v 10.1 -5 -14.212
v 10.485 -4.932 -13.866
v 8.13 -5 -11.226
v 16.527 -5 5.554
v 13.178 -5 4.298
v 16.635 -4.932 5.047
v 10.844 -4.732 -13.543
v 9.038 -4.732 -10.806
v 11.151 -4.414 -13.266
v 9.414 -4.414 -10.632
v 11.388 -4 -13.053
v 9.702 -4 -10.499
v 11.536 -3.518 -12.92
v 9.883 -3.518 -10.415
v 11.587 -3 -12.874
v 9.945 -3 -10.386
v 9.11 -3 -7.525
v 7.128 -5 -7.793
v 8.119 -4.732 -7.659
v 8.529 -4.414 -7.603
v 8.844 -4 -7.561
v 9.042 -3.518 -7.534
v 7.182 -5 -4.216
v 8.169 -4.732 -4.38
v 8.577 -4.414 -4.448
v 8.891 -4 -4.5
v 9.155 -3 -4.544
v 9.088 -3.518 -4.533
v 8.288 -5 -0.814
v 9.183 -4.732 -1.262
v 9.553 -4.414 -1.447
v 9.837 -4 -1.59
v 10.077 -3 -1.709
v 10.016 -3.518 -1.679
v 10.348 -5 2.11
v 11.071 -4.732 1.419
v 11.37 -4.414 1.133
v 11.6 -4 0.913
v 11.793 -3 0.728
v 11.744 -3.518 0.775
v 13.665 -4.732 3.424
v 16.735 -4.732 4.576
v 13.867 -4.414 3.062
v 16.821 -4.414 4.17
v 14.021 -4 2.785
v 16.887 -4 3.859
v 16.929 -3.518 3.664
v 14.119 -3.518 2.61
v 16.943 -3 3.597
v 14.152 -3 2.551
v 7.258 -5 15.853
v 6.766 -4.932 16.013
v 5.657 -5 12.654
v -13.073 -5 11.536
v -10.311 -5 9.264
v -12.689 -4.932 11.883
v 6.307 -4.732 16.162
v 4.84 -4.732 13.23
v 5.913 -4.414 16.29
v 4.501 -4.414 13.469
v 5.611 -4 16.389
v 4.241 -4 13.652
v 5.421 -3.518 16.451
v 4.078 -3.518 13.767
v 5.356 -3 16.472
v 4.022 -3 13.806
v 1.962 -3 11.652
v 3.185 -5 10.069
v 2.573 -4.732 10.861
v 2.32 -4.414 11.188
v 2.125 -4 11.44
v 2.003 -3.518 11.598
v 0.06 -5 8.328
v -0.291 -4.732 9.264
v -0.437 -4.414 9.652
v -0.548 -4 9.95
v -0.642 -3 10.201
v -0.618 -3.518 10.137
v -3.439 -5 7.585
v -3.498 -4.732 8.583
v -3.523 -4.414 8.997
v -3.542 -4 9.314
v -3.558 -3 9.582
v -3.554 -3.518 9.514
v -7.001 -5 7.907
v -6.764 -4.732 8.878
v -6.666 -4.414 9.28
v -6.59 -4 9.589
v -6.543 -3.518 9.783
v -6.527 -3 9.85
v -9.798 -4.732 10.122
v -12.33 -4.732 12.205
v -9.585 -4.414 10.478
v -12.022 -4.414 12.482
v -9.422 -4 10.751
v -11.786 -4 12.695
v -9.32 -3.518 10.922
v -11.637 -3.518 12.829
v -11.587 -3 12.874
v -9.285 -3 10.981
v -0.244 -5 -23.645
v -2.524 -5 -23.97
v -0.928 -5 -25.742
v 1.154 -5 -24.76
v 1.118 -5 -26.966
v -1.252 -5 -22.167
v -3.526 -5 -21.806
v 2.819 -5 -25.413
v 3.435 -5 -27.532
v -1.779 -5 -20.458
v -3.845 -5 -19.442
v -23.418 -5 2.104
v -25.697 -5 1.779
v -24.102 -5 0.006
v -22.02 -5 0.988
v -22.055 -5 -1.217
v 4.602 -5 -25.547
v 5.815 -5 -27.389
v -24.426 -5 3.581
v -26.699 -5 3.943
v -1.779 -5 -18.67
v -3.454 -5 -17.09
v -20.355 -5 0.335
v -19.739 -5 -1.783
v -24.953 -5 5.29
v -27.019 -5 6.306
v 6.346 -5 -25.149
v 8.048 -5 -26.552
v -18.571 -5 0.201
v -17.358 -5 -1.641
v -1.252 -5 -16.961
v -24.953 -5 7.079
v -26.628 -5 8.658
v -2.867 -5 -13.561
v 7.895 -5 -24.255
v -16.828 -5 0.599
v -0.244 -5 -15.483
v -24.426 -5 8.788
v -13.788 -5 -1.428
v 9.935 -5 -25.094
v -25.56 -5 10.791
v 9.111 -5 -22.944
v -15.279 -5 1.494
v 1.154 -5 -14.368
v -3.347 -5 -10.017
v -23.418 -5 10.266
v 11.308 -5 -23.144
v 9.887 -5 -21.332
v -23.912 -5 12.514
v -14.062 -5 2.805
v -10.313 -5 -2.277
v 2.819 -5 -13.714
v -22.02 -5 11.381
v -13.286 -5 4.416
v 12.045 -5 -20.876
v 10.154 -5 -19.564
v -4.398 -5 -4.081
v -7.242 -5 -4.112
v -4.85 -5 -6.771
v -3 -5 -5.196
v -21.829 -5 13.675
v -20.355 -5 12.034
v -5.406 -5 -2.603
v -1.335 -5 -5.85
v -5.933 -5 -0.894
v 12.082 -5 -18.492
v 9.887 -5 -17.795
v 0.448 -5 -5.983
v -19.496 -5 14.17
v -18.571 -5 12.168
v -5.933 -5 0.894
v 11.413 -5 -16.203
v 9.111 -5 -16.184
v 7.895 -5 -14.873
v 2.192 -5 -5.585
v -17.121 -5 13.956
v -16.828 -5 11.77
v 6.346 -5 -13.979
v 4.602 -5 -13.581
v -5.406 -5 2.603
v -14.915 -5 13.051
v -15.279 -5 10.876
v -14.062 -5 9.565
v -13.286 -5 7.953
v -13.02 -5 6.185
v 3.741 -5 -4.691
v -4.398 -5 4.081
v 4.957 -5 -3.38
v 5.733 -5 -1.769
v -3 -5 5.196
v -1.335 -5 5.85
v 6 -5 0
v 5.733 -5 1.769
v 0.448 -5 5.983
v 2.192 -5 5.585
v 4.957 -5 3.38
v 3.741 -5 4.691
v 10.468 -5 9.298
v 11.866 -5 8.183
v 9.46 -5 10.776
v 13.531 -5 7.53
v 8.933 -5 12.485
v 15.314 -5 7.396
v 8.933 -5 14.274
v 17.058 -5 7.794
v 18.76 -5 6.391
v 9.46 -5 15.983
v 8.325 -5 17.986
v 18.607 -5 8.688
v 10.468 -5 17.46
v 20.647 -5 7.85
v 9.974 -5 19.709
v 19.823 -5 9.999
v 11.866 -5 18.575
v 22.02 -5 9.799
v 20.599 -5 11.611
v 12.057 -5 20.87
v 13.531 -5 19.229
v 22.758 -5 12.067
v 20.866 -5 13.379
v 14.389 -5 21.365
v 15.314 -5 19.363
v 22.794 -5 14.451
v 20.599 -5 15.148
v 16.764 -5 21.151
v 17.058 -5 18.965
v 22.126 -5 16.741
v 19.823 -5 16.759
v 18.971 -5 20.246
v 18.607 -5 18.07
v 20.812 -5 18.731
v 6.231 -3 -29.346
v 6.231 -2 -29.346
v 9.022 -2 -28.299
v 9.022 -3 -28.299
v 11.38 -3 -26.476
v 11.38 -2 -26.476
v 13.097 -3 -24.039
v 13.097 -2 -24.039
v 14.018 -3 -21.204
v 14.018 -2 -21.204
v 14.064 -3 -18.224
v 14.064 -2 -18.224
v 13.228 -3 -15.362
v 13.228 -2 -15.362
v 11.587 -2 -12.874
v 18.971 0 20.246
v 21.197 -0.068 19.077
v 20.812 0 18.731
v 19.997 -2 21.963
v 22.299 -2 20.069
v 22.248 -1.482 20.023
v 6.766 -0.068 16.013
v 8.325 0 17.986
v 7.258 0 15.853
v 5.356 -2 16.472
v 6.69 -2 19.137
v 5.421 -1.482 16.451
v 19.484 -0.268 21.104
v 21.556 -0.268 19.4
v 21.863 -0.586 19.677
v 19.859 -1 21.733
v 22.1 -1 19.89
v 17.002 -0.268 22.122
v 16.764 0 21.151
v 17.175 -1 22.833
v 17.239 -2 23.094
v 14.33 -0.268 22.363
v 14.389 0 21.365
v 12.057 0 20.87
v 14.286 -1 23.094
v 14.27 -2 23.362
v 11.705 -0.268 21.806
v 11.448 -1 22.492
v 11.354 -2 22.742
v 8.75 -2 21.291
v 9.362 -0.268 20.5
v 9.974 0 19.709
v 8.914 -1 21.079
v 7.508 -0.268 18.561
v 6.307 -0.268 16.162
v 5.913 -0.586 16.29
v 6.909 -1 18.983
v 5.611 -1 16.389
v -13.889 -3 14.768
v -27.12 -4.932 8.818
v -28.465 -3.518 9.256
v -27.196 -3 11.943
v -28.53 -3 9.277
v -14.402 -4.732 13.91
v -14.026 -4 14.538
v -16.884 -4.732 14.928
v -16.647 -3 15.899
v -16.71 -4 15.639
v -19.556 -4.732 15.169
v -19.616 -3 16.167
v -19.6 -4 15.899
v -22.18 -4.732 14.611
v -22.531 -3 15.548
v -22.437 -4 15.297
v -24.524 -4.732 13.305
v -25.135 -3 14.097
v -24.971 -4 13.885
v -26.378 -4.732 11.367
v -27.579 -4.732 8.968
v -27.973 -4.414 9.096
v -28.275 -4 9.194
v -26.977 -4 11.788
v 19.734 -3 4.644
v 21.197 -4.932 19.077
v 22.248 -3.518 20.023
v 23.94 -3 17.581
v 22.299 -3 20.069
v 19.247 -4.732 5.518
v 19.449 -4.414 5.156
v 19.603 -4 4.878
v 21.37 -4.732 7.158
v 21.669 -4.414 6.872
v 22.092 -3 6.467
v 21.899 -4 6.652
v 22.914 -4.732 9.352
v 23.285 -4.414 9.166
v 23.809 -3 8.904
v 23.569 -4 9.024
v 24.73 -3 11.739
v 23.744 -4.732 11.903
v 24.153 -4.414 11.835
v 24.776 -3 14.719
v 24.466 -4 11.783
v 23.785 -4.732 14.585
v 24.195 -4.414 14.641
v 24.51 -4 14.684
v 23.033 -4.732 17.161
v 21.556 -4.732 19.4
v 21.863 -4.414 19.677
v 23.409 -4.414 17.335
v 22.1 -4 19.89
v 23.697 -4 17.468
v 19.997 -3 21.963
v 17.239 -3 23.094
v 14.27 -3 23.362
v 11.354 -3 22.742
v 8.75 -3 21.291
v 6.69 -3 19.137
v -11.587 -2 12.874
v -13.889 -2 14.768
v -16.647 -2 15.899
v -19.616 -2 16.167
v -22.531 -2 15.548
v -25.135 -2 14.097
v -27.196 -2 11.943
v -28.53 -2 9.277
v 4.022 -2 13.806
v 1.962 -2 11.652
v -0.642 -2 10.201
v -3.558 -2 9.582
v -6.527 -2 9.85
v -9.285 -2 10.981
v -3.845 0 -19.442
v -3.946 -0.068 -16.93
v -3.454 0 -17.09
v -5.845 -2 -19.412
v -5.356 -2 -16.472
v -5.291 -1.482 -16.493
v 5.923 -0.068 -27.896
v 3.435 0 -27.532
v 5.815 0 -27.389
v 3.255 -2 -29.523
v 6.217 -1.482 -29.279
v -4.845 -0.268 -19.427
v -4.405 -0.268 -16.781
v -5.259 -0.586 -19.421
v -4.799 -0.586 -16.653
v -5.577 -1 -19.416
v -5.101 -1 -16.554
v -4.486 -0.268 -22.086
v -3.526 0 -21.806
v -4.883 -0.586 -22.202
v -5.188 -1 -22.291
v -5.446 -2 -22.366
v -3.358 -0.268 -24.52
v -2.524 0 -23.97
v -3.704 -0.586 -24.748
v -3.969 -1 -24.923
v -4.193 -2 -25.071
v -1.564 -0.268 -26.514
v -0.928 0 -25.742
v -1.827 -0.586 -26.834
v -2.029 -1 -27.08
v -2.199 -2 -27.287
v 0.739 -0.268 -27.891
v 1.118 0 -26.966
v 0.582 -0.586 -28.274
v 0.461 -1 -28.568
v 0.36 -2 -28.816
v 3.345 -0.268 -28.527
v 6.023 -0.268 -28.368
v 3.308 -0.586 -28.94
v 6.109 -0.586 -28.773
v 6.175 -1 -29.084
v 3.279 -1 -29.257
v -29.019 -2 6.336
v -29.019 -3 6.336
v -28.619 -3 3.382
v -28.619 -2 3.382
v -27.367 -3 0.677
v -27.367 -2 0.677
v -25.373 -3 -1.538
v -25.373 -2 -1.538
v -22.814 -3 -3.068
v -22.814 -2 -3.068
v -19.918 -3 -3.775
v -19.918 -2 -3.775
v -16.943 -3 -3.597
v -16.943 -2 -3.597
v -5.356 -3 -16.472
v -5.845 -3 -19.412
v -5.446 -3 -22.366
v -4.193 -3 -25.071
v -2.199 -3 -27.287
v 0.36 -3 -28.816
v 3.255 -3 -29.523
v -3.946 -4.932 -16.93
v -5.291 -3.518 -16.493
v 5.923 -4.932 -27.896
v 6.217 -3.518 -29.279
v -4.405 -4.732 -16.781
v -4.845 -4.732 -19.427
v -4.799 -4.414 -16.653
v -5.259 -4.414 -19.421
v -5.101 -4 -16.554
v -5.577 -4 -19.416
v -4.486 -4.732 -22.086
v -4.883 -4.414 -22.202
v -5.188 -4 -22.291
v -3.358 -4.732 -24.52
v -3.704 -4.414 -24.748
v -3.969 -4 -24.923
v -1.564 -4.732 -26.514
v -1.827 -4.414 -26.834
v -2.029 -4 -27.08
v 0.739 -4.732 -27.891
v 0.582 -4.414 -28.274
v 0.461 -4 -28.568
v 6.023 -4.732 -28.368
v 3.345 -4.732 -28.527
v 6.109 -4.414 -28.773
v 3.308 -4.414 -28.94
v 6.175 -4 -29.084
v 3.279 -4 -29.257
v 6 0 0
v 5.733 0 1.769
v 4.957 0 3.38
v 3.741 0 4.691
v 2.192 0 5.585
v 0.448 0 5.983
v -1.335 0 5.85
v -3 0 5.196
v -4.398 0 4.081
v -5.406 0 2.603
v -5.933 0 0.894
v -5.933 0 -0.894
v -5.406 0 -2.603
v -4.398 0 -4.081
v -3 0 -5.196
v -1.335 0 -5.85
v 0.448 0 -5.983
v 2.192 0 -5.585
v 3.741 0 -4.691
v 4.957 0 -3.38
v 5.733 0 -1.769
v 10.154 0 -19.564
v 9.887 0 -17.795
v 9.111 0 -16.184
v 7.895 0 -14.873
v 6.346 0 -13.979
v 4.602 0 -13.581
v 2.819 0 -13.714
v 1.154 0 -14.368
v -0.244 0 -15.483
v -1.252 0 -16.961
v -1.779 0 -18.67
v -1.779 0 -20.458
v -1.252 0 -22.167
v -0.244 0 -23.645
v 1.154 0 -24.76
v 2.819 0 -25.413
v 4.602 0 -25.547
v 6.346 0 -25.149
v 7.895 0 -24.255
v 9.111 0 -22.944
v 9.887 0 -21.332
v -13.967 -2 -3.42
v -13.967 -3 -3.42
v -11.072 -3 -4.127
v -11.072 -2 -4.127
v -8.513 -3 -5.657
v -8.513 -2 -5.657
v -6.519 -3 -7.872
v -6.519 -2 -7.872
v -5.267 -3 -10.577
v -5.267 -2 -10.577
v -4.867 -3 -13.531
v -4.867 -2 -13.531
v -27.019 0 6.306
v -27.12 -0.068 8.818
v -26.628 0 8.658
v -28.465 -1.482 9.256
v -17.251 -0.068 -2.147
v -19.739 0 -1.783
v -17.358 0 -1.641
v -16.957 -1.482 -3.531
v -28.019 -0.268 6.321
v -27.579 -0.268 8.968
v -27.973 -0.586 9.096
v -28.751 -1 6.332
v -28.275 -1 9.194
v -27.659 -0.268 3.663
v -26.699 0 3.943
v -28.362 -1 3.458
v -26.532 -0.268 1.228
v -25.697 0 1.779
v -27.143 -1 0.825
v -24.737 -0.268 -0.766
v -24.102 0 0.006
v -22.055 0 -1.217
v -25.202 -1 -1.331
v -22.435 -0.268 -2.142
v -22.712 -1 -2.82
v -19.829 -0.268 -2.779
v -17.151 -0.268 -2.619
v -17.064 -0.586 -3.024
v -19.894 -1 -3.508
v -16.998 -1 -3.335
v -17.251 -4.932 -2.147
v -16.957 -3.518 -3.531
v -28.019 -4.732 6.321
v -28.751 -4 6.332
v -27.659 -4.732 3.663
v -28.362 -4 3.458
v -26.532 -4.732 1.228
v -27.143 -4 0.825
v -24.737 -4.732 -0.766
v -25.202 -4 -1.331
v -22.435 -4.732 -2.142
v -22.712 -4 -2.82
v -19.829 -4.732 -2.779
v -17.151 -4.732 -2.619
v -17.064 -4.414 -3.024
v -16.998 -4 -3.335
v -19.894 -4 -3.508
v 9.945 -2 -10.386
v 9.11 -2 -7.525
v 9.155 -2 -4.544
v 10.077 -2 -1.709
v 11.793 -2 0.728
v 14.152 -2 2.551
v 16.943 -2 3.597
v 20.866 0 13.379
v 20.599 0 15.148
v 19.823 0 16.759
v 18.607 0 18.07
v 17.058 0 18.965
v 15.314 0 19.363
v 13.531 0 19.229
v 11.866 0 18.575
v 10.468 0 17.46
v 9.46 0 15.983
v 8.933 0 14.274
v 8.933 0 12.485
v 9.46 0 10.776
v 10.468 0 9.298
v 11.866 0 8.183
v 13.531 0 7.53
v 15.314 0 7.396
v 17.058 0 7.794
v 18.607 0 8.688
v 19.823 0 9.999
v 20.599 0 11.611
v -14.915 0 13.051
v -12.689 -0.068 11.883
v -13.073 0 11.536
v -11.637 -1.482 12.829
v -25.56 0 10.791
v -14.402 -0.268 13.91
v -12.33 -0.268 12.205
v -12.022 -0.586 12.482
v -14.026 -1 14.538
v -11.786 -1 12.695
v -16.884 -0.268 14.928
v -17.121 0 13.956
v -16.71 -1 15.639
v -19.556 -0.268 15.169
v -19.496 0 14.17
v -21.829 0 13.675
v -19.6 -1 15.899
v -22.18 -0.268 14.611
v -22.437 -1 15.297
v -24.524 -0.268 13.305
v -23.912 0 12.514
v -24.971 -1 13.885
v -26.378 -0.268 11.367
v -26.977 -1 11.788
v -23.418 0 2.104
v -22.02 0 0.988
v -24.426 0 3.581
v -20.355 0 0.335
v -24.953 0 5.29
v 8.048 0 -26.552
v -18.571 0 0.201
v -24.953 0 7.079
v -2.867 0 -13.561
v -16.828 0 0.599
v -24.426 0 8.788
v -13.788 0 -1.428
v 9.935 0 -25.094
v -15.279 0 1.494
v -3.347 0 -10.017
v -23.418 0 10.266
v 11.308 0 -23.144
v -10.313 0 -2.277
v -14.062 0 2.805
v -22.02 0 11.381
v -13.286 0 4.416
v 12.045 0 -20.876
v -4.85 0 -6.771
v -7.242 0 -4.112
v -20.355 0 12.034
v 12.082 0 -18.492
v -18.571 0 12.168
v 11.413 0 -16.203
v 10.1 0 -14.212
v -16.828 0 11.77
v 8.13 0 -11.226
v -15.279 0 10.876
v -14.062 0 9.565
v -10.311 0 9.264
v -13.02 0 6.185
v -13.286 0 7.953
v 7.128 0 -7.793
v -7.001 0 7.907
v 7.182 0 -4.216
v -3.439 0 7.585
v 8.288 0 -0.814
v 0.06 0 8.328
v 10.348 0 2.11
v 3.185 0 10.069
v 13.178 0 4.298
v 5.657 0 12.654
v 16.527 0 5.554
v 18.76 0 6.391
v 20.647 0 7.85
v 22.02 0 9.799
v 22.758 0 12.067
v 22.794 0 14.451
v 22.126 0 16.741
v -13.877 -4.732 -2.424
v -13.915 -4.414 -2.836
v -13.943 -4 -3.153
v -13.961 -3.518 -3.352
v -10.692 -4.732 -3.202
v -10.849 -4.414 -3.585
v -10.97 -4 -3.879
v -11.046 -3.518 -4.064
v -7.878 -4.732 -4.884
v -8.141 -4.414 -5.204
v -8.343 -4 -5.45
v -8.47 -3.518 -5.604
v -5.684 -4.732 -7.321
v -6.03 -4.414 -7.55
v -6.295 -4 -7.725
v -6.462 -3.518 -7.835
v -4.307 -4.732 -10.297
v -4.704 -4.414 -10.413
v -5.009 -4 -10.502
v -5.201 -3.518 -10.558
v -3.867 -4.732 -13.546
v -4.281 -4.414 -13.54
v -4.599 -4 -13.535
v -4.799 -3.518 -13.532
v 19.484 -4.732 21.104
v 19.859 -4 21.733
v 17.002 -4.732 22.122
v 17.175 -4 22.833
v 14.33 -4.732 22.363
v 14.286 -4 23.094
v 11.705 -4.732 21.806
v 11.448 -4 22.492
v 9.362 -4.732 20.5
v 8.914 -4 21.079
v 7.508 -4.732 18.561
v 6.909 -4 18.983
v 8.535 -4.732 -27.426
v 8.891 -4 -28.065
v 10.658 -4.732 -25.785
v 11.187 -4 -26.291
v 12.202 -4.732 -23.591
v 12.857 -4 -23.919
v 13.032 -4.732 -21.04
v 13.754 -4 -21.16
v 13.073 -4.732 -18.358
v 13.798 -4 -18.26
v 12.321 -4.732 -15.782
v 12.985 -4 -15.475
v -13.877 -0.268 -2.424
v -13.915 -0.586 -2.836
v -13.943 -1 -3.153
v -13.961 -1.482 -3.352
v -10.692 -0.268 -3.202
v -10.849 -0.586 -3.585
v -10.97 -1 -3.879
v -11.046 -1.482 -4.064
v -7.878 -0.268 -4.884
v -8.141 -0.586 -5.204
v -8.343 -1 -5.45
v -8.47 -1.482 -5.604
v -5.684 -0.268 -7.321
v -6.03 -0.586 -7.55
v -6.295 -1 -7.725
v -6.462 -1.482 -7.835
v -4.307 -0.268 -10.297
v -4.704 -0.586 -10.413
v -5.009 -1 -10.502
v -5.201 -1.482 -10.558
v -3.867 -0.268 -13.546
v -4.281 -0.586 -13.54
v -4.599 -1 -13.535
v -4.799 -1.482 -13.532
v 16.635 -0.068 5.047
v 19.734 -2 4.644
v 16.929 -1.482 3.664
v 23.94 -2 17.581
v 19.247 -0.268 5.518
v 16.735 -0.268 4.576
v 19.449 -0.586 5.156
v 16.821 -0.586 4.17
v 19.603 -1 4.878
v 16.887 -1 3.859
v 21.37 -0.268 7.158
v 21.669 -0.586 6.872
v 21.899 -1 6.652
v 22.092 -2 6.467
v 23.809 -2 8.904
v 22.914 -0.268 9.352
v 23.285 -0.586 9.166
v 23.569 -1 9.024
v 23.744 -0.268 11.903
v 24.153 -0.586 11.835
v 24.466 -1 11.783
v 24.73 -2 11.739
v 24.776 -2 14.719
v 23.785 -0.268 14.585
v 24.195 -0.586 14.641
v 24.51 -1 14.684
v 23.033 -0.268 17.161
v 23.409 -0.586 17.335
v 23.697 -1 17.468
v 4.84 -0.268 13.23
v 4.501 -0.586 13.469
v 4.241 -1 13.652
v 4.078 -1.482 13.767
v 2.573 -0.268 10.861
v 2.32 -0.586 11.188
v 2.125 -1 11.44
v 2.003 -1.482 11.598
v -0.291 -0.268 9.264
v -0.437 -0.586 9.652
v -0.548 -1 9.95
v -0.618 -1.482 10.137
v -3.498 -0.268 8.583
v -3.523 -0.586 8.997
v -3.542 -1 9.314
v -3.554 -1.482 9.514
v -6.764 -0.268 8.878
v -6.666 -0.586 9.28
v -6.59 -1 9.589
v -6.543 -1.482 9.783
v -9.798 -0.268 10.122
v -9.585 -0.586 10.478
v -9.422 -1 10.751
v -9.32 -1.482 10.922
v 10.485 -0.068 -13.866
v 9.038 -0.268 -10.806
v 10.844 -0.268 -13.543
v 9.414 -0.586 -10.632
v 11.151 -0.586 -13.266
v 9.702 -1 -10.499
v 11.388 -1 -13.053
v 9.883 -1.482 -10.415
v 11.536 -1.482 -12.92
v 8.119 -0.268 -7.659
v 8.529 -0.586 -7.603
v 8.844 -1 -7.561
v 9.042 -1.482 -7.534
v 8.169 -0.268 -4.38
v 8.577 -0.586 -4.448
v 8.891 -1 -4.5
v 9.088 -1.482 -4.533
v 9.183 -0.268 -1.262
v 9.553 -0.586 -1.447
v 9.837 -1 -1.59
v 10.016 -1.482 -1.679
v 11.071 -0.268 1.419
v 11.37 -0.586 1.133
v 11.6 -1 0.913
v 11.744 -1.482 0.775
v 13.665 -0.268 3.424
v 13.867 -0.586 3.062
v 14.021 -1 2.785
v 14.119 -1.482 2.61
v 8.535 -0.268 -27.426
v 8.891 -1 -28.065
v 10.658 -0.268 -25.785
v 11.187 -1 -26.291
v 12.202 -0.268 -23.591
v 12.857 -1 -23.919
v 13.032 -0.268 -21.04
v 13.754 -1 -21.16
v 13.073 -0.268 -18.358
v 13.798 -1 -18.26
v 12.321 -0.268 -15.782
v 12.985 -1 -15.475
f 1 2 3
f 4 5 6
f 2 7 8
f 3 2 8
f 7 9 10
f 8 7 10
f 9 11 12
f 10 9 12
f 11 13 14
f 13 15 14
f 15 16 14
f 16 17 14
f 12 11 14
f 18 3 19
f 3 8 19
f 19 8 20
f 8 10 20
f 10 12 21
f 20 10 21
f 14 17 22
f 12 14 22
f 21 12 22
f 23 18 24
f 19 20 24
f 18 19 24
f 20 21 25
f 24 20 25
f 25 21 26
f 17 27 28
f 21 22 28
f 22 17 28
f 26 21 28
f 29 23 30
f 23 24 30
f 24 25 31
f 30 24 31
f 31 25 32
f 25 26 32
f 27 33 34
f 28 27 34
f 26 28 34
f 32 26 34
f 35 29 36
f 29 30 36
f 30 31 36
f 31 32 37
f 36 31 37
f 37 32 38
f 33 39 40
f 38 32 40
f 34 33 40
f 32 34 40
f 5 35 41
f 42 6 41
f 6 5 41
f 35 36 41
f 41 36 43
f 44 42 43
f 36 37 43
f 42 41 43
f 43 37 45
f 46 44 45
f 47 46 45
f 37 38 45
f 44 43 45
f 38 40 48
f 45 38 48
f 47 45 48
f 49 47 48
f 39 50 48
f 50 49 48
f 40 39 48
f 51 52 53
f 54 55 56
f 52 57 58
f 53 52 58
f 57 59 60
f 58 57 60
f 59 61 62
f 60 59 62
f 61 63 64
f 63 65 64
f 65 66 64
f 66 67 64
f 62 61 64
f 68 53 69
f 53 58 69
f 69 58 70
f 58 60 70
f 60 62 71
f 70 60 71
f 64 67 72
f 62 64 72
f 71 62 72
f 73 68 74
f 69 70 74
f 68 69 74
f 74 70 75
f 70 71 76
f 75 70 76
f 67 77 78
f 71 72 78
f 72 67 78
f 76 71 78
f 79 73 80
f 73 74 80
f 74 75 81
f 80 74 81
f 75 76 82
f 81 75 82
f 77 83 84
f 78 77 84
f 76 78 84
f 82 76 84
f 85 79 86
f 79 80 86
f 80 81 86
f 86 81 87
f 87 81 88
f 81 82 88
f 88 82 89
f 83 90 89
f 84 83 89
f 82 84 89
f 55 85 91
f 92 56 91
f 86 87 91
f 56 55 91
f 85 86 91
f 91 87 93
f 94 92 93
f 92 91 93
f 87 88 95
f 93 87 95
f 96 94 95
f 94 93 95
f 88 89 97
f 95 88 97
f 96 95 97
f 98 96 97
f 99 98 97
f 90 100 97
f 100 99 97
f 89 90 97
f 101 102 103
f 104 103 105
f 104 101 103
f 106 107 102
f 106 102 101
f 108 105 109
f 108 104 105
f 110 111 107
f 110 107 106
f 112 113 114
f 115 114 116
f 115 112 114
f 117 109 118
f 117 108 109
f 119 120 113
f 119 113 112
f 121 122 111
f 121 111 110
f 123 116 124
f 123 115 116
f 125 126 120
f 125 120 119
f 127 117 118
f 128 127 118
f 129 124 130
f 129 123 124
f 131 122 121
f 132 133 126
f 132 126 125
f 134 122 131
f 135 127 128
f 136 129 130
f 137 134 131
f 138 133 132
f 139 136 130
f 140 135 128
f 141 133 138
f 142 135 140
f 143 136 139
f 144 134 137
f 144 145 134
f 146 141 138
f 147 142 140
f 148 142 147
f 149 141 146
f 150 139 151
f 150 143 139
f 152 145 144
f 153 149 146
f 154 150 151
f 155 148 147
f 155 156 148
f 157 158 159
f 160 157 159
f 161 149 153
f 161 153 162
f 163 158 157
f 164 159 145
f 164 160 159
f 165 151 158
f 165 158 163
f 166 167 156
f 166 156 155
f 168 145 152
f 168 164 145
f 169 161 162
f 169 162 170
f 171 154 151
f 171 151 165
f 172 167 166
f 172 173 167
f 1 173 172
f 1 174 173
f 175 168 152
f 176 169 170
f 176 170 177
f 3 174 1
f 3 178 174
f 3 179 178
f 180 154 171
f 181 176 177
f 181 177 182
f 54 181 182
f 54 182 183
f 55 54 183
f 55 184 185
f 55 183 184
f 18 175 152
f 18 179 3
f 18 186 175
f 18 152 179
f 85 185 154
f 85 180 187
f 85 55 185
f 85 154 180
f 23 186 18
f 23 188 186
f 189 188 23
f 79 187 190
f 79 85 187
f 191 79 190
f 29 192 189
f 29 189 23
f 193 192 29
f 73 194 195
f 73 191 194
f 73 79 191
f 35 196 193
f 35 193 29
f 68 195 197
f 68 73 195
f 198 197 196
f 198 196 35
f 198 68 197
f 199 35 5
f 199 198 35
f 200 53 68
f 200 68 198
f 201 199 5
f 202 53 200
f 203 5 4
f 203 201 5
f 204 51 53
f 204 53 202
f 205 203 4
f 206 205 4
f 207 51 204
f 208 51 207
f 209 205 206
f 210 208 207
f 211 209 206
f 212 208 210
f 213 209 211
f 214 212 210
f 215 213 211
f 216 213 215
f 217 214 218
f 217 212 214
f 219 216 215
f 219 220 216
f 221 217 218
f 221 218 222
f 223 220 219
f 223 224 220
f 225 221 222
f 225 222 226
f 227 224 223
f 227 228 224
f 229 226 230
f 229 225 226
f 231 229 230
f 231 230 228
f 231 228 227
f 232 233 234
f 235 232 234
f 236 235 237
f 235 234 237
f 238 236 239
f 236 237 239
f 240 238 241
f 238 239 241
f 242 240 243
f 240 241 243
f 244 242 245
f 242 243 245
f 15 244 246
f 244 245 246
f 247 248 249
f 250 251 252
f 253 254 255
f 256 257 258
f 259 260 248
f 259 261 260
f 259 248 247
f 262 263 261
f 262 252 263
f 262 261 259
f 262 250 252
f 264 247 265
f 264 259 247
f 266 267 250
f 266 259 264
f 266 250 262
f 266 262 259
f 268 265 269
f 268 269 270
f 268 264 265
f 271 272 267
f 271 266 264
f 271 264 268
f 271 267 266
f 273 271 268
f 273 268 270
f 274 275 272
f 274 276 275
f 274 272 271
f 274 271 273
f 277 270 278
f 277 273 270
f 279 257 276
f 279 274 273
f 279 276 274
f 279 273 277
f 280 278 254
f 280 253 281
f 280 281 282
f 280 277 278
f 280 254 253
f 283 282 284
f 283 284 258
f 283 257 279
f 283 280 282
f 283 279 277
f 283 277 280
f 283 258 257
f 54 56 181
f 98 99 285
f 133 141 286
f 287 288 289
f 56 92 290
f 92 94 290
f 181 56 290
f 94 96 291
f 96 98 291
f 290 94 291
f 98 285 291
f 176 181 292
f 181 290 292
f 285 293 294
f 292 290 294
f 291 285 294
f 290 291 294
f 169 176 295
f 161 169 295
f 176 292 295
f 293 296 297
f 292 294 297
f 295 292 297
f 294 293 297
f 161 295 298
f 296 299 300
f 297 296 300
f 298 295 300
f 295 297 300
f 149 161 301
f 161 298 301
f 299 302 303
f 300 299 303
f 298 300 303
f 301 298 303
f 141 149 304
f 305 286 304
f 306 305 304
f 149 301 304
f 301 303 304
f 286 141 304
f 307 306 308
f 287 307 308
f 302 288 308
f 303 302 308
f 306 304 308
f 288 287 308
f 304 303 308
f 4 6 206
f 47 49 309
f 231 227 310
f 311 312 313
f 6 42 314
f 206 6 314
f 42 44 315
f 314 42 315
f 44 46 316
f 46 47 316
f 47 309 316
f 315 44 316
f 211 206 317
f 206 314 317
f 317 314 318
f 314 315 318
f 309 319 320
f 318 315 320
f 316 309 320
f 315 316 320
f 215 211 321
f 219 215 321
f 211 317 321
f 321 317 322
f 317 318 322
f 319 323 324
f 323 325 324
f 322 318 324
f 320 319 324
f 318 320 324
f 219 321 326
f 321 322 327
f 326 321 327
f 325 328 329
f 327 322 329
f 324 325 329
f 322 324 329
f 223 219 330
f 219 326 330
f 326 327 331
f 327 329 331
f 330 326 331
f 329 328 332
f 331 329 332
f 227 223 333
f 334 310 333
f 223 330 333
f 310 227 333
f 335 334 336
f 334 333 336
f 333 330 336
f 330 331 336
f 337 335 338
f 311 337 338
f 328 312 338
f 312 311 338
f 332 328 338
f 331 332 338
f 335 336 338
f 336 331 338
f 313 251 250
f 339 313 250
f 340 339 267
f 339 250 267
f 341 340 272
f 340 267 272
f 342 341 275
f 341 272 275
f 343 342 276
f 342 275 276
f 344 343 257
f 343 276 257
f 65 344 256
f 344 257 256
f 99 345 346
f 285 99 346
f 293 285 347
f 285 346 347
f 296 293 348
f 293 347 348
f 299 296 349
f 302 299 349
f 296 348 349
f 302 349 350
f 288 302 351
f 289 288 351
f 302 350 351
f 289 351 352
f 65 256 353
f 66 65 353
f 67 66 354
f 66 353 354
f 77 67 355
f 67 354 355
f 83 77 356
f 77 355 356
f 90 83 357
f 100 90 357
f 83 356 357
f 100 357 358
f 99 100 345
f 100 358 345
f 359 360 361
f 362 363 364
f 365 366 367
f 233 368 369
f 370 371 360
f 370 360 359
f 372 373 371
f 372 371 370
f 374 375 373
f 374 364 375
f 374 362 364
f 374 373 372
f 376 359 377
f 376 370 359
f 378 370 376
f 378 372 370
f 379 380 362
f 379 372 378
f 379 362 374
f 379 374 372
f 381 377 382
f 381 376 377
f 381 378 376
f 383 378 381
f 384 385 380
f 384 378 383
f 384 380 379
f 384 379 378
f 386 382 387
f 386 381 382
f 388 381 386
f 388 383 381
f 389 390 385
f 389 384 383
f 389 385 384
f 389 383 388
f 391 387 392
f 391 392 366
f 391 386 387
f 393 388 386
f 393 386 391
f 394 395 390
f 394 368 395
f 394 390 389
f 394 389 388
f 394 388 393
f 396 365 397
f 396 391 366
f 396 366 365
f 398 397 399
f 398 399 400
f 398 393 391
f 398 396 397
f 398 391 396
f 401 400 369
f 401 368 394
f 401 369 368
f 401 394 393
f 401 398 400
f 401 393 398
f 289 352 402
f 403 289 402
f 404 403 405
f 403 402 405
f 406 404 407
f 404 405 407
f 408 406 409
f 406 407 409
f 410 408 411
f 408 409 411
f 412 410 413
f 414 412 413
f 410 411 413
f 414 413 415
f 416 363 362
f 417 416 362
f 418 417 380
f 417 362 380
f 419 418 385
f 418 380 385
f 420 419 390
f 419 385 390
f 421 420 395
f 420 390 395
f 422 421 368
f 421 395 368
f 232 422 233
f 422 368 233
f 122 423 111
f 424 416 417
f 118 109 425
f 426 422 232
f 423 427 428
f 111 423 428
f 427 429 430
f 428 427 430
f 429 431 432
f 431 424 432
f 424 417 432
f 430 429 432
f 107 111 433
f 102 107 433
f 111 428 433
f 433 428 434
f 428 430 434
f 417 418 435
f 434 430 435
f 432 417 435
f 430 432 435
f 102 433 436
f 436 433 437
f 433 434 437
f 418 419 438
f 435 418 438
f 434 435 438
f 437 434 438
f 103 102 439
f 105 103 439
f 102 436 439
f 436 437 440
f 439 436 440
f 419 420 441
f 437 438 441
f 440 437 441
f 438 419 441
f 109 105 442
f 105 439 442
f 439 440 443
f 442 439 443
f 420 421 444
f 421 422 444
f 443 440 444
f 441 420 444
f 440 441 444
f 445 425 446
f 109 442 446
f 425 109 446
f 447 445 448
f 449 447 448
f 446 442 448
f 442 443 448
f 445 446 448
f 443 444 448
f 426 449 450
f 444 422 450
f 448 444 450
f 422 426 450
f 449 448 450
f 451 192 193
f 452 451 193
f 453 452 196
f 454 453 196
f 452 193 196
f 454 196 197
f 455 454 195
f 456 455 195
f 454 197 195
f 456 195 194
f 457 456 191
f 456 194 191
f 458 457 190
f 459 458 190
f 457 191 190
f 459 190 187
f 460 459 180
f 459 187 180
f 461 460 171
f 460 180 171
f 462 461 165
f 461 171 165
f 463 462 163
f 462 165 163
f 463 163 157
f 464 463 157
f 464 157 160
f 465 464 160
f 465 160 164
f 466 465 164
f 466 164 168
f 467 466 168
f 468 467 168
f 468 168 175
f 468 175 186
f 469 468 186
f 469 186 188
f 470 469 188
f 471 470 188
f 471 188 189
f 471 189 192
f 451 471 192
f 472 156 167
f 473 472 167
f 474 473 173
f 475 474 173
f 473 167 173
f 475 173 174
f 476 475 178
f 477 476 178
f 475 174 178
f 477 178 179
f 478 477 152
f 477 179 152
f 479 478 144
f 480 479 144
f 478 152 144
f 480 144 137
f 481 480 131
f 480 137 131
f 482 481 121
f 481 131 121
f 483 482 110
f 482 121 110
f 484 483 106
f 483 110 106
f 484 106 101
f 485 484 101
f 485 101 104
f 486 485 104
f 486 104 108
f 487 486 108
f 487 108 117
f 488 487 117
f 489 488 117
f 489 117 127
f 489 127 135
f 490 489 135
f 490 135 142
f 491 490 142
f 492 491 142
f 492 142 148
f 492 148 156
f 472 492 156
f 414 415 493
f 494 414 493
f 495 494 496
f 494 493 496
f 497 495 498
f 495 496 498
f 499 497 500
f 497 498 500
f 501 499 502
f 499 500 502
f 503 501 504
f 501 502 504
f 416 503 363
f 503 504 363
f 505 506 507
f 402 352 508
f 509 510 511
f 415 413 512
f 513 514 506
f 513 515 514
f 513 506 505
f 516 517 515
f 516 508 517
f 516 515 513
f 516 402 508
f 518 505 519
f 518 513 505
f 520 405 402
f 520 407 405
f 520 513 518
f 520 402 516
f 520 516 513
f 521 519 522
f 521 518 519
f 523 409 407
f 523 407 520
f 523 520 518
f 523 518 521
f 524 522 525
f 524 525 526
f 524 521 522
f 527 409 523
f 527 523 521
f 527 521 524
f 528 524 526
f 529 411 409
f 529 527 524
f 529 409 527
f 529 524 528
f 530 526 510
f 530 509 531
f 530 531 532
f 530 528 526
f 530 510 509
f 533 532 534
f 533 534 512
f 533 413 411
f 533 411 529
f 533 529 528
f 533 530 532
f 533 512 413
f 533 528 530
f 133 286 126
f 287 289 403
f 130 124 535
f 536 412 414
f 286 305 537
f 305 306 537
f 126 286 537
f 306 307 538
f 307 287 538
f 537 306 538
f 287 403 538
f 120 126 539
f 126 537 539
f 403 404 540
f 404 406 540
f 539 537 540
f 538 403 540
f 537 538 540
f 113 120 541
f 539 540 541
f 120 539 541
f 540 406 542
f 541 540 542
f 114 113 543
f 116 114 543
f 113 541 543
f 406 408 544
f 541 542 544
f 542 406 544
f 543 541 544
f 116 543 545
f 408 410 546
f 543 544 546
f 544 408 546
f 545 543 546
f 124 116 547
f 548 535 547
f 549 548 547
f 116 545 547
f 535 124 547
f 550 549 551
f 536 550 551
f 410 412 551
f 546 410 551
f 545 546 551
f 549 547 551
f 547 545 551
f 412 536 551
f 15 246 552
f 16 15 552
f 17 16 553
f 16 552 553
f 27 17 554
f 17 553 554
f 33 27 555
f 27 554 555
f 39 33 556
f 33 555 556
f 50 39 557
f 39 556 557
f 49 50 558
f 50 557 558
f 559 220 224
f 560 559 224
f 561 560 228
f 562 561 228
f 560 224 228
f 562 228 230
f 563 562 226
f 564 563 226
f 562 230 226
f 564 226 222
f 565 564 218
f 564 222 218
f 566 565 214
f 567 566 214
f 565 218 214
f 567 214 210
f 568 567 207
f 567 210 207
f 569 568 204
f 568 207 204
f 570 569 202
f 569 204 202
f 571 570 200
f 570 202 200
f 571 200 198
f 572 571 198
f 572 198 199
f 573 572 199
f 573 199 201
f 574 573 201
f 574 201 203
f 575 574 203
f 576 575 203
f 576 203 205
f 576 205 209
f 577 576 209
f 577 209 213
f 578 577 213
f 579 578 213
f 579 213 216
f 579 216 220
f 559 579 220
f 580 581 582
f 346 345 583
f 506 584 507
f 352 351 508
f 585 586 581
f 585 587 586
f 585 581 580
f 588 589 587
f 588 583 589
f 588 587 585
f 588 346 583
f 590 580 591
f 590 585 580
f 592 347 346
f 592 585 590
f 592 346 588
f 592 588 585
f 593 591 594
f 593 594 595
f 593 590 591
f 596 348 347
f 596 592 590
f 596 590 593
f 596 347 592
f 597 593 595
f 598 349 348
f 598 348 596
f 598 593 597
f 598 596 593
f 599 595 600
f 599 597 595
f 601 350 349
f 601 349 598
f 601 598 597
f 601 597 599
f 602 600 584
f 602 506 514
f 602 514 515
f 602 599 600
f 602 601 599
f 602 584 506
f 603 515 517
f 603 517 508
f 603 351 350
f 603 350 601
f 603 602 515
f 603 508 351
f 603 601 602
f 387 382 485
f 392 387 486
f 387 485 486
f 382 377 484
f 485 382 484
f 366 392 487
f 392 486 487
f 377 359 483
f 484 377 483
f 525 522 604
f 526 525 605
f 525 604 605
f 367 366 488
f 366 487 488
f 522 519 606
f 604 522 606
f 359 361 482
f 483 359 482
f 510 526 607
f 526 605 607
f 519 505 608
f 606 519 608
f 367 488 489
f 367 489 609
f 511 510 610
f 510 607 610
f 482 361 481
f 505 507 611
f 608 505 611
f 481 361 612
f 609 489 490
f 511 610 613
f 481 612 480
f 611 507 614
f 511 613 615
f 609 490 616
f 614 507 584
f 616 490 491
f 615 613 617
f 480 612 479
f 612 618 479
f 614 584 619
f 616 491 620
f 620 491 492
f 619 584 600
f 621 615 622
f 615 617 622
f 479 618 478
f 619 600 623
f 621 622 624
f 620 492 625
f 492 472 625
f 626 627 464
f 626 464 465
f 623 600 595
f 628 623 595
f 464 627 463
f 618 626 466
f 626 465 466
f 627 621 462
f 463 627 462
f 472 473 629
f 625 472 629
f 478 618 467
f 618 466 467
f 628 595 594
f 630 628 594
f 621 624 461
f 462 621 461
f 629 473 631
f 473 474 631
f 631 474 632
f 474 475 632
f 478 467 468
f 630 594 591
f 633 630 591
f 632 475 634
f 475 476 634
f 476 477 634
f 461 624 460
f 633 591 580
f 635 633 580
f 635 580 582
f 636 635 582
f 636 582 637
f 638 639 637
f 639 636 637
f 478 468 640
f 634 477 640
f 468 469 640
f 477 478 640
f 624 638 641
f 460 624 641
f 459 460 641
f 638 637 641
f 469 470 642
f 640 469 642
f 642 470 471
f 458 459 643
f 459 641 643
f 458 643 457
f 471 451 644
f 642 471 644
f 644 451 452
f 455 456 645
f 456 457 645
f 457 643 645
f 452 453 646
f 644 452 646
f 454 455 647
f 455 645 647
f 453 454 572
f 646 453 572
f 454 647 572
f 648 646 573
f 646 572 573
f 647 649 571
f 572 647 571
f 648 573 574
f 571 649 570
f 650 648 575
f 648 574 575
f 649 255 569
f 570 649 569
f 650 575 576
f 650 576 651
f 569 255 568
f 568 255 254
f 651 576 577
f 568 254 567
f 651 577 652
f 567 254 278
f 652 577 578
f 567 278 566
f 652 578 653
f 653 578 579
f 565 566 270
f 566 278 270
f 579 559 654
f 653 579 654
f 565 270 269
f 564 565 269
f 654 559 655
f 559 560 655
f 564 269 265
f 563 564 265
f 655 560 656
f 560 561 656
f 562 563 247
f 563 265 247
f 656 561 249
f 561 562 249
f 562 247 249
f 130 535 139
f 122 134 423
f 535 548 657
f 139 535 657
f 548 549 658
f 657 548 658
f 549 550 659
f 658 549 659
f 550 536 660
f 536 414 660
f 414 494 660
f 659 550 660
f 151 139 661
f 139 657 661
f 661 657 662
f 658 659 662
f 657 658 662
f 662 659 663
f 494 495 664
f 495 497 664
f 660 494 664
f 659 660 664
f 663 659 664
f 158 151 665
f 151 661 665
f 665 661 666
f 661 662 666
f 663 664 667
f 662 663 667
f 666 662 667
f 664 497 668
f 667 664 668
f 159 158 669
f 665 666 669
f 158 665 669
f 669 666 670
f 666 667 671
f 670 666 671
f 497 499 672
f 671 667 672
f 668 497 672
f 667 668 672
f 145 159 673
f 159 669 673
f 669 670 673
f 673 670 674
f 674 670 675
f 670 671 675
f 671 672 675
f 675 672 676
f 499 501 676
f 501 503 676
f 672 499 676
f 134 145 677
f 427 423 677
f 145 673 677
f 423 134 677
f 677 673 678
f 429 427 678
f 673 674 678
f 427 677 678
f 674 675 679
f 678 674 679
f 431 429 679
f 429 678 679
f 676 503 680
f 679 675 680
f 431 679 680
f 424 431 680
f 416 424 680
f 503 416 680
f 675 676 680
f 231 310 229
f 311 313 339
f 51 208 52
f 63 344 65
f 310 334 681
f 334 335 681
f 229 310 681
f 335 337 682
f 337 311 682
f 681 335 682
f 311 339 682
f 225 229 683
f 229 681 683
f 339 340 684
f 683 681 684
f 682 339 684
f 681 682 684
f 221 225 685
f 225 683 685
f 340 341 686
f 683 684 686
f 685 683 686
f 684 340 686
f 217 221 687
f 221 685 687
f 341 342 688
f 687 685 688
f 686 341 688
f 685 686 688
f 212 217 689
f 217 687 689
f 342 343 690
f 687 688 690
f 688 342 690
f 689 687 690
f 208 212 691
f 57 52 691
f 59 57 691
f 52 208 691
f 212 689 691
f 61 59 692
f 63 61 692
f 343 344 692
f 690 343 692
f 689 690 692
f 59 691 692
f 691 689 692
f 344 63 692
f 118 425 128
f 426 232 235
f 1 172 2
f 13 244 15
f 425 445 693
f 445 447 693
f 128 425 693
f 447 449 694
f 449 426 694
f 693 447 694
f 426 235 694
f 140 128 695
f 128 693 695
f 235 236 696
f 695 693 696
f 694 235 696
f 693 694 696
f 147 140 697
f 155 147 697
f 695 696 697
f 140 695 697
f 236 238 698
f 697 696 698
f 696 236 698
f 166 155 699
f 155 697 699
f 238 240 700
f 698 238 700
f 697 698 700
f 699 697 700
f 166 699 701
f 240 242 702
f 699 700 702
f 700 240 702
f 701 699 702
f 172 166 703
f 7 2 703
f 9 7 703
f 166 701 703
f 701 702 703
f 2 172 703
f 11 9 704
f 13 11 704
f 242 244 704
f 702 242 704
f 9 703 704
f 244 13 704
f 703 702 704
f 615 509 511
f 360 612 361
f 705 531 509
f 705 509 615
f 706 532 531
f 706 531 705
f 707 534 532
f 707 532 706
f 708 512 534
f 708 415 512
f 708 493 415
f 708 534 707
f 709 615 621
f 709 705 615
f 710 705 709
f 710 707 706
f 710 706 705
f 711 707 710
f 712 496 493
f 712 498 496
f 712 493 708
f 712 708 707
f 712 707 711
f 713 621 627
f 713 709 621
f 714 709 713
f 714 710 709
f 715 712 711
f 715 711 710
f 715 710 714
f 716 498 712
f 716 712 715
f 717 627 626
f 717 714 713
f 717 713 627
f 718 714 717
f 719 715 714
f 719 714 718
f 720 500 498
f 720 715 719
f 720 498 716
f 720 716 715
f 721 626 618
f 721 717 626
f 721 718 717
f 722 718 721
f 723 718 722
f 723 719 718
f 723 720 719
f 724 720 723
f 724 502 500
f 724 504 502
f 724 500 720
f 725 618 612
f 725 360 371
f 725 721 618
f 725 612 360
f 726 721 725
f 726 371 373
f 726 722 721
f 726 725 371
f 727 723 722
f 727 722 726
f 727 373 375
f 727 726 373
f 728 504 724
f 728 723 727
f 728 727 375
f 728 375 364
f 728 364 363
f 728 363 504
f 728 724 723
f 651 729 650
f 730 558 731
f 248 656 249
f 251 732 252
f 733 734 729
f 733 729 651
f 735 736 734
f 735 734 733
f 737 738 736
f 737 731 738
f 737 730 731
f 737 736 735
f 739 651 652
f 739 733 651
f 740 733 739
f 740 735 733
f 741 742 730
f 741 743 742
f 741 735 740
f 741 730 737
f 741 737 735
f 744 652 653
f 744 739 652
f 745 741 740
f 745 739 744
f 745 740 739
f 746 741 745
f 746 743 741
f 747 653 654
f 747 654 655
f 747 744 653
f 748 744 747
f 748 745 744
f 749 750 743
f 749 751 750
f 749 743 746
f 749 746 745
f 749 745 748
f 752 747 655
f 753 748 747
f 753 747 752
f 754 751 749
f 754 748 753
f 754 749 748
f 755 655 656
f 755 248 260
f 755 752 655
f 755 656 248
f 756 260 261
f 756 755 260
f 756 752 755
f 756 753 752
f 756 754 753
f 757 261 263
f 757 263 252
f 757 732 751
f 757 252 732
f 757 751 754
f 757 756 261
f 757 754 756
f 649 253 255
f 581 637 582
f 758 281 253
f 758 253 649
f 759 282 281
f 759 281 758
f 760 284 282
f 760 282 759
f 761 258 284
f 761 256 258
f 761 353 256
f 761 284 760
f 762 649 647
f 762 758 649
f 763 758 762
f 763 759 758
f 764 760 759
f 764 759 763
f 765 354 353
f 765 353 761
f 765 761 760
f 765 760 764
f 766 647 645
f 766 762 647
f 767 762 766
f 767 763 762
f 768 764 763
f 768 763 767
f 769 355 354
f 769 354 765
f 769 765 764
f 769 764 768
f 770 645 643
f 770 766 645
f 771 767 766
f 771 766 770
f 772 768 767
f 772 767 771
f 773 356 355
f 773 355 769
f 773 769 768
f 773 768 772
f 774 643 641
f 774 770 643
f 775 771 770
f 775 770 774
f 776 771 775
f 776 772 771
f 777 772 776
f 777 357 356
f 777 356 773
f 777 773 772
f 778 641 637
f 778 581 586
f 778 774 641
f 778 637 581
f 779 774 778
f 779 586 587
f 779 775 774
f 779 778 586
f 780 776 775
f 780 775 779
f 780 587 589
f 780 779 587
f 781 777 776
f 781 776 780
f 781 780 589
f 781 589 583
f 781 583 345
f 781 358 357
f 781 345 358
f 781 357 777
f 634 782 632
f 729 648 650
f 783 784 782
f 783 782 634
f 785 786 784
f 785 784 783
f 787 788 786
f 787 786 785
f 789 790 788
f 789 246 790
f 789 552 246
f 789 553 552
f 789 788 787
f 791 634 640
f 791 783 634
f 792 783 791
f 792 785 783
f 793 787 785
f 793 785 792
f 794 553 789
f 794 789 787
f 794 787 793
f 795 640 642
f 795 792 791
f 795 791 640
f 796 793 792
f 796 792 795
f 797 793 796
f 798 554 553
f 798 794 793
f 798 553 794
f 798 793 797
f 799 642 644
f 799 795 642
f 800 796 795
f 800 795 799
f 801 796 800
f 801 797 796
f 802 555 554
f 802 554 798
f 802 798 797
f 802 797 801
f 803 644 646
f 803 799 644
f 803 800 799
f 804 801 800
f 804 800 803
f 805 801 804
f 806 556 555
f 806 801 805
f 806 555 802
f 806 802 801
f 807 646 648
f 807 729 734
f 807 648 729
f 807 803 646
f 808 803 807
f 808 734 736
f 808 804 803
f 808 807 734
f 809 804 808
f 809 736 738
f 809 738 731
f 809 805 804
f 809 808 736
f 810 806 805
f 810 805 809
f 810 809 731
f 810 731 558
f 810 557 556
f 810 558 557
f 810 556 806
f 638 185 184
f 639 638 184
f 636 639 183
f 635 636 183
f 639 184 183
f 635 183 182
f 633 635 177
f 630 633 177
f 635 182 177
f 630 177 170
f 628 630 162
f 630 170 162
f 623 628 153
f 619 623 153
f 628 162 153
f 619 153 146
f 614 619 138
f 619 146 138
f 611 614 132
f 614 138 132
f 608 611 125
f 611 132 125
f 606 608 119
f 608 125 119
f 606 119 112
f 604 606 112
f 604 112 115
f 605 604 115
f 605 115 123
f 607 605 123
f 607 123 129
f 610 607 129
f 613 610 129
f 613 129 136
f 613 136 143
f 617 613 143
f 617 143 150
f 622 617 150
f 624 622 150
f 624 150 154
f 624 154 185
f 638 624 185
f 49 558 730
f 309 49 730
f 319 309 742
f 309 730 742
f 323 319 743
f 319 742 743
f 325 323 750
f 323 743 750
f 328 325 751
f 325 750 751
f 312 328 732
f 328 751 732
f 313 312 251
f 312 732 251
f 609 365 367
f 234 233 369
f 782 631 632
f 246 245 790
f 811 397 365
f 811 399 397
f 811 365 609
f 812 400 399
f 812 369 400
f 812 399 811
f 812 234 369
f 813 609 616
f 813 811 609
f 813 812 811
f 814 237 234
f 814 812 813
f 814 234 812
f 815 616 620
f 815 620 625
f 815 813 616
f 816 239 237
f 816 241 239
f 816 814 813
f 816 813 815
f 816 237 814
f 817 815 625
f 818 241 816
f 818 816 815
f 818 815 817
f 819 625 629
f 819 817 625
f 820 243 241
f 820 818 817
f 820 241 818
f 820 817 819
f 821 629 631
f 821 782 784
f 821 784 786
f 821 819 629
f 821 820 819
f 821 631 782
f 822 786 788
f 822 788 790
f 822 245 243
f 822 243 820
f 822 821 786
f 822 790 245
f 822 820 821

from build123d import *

# Parameters (mm, degrees)
F1_DEPTH = 5
F2_R     = 6
F3_DEPTH = 25
F4_R     = 2
F5_R     = 2


with BuildPart() as f1:
    # F0 (on Front) → F1 (new body)
    with BuildSketch(Plane.XZ):
        with BuildLine():
            ThreePointArc((16.942817, 3.597355), (24.375758, 10.287003), (22.298824, 20.068942))
            ThreePointArc((22.298824, 20.068942), (12.788949, 23.161235), (5.356007, 16.471587))
            ThreePointArc((5.356007, 16.471587), (-2.076934, 9.78194), (-11.586809, 12.874232))
            ThreePointArc((-11.586809, 12.874232), (-21.096685, 15.966524), (-28.529626, 9.276876))
            ThreePointArc((-28.529626, 9.276876), (-26.452692, -0.505063), (-16.942817, -3.597355))
            ThreePointArc((-16.942817, -3.597355), (-7.432941, -6.689647), (-5.356007, -16.471587))
            ThreePointArc((-5.356007, -16.471587), (-3.279073, -26.253527), (6.230802, -29.345819))
            ThreePointArc((6.230802, -29.345819), (13.663743, -22.656172), (11.586809, -12.874232))
            ThreePointArc((11.586809, -12.874232), (9.509875, -3.092292), (16.942817, 3.597355))
        make_face()
    extrude(amount=F1_DEPTH)

    # F2 (on face) → F3 (cut)
    with BuildSketch(Plane.XZ.offset(5)):
        with Locations((-19.019751, 6.184585)):
            Circle(F2_R)
        Circle(F2_R)
        with Locations((14.865883, 13.379295)):
            Circle(F2_R)
        with Locations((4.153868, -19.563879)):
            Circle(F2_R)
    extrude(amount=-F3_DEPTH, mode=Mode.SUBTRACT)

    # F4
    f4_edges = [f1.edges().sort_by_distance(p)[0] for p in [
        (-28.529626, -5, 9.276877),
    ]]
    fillet(f4_edges, radius=F4_R)

    # F5
    f5_edges = [f1.edges().sort_by_distance(p)[0] for p in [
        (-28.529626, 0, 9.276877),
    ]]
    fillet(f5_edges, radius=F5_R)


solid = f1.part
